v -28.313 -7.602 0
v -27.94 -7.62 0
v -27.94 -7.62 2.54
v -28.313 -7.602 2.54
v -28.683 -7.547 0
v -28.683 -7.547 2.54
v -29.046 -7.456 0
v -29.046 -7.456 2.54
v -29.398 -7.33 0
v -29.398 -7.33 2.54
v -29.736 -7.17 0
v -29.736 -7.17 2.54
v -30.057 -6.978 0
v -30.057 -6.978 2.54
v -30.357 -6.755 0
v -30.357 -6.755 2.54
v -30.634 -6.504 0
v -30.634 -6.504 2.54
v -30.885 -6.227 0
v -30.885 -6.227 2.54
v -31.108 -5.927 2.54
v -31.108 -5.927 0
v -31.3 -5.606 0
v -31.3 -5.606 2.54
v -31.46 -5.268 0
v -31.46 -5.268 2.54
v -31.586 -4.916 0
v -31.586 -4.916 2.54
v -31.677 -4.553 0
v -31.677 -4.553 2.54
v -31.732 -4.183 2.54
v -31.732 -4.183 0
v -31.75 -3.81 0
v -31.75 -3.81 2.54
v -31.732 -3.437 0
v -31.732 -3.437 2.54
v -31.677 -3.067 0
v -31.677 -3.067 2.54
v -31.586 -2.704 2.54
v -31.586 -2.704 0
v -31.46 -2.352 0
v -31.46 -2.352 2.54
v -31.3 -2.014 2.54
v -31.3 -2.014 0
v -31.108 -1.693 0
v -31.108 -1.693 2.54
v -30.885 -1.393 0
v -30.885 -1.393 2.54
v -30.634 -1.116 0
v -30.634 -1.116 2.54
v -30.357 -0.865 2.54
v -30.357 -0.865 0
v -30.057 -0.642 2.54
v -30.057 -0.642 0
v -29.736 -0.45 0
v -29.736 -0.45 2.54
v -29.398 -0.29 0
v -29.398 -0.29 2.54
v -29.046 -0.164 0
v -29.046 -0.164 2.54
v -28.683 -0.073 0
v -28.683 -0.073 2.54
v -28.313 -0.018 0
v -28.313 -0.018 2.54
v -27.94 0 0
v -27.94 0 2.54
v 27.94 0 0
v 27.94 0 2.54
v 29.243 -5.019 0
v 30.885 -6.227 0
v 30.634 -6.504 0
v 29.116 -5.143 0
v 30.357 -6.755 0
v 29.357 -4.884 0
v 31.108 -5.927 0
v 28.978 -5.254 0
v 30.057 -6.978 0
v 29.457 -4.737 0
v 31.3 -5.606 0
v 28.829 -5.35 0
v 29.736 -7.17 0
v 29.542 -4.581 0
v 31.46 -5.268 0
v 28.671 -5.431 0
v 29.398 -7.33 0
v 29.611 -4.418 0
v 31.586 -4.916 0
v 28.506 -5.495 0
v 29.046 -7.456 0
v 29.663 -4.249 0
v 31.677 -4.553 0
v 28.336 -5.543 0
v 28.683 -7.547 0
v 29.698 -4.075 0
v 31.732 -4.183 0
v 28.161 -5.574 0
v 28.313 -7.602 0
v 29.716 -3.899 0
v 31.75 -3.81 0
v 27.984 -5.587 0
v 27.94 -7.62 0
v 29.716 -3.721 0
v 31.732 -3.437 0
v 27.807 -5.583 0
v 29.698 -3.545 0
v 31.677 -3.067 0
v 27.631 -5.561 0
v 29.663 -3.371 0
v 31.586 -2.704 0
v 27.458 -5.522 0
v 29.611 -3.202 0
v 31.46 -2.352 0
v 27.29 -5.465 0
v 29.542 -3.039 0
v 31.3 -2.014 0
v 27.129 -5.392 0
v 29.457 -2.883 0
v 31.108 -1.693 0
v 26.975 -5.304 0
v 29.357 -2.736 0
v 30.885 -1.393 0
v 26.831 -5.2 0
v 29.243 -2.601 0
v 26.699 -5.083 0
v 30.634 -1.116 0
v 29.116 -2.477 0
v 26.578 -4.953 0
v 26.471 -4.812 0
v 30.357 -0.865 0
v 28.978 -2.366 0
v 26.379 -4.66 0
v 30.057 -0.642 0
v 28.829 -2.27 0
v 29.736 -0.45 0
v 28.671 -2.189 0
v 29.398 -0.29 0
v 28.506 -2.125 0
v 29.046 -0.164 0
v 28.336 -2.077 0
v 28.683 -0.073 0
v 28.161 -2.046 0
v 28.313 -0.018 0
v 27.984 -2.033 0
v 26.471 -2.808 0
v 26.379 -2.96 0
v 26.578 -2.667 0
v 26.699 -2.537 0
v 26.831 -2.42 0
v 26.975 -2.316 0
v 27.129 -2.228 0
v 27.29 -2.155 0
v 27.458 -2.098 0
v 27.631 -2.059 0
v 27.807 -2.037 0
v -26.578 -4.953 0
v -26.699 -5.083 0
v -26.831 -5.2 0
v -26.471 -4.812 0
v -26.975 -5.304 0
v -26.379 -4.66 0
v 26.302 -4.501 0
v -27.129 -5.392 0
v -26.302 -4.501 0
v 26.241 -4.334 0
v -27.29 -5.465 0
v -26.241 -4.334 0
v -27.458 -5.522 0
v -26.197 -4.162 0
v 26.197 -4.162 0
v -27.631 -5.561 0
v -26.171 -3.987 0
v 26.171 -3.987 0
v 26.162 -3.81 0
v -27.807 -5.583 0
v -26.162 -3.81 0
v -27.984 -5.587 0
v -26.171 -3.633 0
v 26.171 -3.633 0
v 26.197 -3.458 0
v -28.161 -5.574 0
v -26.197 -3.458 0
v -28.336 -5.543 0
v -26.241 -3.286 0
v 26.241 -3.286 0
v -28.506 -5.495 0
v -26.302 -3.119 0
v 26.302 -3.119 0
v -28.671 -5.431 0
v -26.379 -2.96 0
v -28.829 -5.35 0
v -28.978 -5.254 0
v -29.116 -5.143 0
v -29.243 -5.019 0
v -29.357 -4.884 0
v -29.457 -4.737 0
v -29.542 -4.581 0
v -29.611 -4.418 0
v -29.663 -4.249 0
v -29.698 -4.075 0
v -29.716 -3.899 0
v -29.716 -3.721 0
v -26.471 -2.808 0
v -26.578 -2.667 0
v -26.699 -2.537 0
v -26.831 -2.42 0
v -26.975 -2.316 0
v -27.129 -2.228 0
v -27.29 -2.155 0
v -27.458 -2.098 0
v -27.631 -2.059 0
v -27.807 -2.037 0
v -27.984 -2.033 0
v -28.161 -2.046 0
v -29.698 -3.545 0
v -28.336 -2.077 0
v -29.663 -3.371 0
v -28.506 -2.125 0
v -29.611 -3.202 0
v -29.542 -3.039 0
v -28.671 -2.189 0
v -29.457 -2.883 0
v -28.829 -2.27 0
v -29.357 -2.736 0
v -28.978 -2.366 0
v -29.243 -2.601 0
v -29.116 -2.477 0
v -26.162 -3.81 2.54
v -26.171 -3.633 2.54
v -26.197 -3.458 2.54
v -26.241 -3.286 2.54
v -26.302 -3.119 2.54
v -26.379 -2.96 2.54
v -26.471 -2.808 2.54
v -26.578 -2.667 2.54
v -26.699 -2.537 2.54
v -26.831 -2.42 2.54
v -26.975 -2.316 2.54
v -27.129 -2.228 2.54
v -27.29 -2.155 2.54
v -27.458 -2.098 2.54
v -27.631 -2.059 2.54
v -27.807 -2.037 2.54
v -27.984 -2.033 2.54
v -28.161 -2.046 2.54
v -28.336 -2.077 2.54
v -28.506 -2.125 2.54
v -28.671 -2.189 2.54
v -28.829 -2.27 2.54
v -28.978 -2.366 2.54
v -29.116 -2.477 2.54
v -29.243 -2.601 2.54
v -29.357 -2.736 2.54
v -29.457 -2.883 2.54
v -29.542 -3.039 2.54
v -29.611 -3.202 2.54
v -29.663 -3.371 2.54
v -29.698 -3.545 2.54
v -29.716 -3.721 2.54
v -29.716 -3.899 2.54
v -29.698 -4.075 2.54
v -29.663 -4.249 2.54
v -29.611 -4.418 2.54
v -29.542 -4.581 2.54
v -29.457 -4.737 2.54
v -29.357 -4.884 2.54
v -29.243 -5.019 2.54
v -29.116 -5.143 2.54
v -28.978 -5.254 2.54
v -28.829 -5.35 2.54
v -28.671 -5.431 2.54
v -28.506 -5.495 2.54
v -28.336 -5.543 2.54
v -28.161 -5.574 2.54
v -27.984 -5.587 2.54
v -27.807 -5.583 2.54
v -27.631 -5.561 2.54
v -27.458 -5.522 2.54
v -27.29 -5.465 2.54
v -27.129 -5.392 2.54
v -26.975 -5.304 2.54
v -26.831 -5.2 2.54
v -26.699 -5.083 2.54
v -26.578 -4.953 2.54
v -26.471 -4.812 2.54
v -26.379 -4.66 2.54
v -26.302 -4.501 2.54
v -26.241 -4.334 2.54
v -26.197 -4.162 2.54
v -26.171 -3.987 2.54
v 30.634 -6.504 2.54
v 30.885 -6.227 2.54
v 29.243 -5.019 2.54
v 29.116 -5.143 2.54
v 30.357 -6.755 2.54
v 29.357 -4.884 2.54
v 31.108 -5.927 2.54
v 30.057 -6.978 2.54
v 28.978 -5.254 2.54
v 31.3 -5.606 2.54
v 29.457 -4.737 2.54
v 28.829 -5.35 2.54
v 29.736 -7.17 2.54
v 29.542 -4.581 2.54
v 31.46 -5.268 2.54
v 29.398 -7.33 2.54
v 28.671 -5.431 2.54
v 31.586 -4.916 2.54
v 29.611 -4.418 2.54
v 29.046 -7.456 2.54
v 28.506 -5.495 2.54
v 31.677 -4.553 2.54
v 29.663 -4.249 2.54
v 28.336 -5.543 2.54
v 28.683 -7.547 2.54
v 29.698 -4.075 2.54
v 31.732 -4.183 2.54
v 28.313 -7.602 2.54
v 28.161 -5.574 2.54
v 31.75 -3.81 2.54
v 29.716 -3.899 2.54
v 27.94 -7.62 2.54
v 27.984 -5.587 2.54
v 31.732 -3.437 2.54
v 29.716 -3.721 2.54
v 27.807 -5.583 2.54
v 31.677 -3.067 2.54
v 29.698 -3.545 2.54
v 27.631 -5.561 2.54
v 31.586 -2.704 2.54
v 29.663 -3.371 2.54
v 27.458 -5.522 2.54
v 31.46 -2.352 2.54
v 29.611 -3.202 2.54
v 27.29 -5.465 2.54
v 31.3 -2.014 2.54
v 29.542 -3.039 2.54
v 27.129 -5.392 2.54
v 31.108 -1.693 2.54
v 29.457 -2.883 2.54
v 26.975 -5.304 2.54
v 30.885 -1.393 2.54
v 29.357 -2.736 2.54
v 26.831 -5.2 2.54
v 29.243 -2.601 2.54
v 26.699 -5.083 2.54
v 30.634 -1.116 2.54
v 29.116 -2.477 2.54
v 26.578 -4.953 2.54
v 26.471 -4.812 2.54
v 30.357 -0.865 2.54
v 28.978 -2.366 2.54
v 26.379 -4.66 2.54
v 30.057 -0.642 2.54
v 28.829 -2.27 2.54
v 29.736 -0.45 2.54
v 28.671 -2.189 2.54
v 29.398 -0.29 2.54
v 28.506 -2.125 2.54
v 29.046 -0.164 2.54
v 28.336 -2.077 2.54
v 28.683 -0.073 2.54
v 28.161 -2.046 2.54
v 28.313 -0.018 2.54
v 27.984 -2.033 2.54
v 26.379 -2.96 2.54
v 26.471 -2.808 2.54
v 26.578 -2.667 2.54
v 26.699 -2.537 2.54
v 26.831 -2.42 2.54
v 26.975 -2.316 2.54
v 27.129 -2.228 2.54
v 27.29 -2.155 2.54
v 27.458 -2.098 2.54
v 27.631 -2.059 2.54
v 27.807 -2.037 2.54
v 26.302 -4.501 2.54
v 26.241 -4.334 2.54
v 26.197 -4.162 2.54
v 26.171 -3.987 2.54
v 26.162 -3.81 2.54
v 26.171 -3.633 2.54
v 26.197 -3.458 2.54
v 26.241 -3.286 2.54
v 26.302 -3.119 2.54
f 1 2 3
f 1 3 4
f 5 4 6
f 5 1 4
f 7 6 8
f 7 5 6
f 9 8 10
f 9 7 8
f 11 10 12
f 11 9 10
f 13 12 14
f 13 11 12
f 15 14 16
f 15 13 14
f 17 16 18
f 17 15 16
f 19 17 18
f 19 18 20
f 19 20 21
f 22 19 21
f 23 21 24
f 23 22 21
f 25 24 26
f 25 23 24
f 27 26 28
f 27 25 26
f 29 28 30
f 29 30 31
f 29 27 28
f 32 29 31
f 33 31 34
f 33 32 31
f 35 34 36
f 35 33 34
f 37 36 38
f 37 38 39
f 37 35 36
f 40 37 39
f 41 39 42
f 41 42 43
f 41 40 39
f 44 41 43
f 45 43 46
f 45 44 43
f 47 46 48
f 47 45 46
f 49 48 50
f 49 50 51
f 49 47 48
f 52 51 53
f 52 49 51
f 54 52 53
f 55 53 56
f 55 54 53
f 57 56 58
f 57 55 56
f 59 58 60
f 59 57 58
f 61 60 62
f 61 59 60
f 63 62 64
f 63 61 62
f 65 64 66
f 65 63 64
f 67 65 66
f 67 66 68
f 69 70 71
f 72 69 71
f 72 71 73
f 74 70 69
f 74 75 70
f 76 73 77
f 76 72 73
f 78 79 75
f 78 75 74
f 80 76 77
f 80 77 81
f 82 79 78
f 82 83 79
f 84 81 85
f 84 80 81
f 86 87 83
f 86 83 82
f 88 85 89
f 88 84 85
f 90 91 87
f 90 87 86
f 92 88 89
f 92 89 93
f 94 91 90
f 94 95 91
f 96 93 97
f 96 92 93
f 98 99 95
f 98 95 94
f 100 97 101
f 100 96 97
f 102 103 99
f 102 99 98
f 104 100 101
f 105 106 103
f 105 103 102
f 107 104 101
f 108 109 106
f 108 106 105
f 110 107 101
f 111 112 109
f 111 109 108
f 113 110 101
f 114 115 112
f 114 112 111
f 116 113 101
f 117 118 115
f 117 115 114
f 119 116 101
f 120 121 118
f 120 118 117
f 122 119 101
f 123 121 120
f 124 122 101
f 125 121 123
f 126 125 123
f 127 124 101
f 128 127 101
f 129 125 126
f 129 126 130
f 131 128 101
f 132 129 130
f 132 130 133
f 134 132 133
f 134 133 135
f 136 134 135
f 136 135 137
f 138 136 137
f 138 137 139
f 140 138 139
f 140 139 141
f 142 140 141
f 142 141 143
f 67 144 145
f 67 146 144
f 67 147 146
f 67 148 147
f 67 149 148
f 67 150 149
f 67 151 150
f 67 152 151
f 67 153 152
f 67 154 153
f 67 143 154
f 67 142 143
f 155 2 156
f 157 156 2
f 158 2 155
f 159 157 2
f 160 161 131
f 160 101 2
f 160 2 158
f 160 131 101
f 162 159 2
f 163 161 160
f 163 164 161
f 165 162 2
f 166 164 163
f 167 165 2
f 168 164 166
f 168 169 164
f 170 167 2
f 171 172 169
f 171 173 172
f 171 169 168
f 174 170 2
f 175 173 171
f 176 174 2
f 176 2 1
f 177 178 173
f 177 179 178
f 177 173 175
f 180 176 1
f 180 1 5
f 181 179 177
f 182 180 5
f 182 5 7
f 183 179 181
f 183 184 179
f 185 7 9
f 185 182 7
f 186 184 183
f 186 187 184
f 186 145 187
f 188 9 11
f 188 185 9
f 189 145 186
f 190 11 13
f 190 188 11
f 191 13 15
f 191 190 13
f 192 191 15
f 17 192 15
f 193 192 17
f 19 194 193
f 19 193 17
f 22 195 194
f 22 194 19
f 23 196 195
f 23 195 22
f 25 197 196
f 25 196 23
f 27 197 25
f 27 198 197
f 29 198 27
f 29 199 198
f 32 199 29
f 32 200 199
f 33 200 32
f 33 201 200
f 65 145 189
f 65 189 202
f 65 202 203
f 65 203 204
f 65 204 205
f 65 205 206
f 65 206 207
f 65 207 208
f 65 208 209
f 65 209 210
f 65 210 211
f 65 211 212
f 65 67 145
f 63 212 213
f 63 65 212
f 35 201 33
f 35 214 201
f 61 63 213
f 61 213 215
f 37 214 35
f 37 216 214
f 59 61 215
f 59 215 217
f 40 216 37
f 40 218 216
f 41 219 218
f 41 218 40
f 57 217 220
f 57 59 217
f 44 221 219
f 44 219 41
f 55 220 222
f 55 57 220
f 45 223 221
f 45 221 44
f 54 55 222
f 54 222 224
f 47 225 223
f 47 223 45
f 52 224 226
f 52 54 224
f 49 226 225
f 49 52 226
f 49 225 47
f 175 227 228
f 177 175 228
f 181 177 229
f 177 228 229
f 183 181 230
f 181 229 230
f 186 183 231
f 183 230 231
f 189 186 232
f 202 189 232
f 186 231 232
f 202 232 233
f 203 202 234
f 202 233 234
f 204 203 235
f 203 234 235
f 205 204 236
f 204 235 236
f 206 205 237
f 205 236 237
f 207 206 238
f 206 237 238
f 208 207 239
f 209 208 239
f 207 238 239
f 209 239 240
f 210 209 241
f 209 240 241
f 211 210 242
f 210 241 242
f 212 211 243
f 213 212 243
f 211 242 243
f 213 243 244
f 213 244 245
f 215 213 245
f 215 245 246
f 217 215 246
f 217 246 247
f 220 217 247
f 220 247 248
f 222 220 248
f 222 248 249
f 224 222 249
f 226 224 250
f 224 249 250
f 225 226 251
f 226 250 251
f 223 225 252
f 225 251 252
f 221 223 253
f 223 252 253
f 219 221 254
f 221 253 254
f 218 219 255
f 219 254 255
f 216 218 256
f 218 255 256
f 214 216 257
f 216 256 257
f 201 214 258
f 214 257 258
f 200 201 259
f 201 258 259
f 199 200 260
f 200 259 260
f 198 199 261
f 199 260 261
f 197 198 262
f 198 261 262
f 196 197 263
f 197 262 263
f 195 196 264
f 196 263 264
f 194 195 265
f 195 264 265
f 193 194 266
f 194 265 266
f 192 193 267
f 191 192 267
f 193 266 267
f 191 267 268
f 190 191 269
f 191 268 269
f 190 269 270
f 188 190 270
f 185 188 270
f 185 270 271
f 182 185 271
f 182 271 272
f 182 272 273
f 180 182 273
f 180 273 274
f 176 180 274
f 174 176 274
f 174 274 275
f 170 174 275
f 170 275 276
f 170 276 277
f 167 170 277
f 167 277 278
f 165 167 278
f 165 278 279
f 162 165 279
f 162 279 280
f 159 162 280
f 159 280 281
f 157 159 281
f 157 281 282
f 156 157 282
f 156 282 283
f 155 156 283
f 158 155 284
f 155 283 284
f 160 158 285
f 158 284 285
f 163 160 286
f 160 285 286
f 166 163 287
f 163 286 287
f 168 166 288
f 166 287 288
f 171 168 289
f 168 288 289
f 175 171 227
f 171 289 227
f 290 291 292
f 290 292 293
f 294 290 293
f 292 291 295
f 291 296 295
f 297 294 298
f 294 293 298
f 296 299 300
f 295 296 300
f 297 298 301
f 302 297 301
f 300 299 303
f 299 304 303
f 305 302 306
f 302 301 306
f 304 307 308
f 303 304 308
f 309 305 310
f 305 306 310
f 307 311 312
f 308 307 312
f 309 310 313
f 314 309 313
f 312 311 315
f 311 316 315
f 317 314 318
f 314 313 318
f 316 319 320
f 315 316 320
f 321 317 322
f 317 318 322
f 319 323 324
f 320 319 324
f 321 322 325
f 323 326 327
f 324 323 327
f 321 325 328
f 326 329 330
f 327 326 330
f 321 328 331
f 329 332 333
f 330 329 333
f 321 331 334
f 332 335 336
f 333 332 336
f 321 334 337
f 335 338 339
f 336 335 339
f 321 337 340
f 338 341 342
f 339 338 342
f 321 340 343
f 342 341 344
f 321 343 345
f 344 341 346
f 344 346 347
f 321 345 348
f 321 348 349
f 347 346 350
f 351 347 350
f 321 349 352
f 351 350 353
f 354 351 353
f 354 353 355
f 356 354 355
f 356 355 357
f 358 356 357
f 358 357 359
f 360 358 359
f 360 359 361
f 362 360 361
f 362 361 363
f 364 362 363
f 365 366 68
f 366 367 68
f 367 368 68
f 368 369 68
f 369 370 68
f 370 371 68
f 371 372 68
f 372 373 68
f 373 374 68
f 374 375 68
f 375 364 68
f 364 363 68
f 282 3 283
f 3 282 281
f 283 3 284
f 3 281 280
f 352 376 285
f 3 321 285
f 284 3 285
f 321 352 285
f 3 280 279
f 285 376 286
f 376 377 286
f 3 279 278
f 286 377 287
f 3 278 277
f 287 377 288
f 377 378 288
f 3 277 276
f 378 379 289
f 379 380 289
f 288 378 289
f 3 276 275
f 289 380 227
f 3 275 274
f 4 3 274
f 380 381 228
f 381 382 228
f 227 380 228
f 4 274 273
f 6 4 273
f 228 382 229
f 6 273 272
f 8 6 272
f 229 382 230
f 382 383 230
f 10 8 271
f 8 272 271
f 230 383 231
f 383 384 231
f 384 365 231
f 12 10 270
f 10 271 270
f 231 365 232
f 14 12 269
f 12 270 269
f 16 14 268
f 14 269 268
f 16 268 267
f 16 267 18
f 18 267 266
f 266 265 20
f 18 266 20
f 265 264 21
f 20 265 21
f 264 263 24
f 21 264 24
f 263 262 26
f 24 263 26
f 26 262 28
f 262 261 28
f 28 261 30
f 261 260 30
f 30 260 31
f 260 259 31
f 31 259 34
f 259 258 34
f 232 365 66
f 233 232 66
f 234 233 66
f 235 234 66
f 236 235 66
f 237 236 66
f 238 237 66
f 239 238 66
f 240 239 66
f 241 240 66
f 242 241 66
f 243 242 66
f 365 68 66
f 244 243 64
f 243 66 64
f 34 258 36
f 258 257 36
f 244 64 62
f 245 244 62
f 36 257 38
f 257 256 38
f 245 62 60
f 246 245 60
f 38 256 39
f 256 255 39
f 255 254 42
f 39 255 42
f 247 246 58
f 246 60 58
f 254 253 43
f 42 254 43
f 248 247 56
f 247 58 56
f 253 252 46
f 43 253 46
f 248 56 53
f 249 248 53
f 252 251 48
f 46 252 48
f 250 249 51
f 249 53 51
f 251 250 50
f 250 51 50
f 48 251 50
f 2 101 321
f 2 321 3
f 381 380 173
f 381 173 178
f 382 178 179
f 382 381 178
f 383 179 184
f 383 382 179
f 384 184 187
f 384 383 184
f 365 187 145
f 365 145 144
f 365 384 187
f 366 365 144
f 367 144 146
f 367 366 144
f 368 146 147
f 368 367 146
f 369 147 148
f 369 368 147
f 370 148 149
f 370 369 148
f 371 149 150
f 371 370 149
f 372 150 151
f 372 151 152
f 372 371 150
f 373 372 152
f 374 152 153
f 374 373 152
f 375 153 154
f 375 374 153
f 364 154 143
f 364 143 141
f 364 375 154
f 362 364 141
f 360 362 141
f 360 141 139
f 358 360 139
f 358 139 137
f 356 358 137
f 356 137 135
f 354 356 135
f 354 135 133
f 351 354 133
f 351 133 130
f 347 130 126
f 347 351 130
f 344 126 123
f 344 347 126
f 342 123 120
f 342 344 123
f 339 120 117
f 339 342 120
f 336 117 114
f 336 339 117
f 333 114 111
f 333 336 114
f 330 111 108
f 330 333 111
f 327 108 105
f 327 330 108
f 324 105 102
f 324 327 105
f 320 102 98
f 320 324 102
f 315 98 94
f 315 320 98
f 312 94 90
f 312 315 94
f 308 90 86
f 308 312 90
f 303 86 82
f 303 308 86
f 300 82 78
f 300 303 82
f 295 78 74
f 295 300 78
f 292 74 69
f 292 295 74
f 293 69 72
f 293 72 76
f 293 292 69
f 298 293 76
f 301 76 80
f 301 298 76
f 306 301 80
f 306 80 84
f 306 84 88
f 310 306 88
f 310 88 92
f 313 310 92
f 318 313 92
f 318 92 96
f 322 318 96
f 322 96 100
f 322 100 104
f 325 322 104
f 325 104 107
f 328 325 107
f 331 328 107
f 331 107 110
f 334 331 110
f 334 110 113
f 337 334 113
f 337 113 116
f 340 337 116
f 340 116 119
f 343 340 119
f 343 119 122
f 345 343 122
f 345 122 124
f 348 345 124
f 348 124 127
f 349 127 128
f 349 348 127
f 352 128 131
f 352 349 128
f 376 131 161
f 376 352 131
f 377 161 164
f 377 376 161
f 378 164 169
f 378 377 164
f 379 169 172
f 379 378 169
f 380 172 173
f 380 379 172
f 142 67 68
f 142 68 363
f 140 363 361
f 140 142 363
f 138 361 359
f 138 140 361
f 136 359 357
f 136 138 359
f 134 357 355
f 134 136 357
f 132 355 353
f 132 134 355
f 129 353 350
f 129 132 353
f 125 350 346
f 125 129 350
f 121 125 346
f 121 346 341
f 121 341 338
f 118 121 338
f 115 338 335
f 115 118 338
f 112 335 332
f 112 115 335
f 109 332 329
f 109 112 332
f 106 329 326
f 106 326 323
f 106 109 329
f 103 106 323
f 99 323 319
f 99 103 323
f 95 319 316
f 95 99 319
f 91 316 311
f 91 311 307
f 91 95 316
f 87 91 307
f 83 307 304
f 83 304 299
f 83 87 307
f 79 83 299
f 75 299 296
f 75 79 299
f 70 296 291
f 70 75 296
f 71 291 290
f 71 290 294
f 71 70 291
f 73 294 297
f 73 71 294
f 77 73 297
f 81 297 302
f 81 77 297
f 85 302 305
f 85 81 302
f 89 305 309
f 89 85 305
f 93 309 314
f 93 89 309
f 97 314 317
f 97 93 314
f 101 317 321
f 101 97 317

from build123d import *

# Parameters (mm, degrees)
BOSS_EXTRUDE1_DEPTH = 2.54
SKETCH2_R           = 1.778
CUT_EXTRUDE1_DEPTH  = 2.54


with BuildPart() as part:
    # Sketch1 → Boss-Extrude1 (new body)
    with BuildSketch(Plane.XY):
        with BuildLine():
            Line((-27.94, 0), (27.94, 0))
            ThreePointArc((27.94, 0), (31.75, -3.81), (27.94, -7.62))
            Line((27.94, -7.62), (-27.94, -7.62))
            ThreePointArc((-27.94, -7.62), (-31.75, -3.81), (-27.94, 0))
        make_face()
    extrude(amount=BOSS_EXTRUDE1_DEPTH)

    # Sketch2 → Cut-Extrude1 (cut)
    with BuildSketch(Plane.XY.offset(2.54)):
        with Locations((-27.94, -3.81)):
            Circle(SKETCH2_R)
    cut_extrude1 = extrude(amount=-CUT_EXTRUDE1_DEPTH, mode=Mode.SUBTRACT)

    # Mirror1: Cut-Extrude1 across plane
    add(cut_extrude1.mirror(Plane(origin=(0, 0, 0), x_dir=(0, 0, 1), z_dir=(1, 0, 0))), mode=Mode.SUBTRACT)


solid = part.part
